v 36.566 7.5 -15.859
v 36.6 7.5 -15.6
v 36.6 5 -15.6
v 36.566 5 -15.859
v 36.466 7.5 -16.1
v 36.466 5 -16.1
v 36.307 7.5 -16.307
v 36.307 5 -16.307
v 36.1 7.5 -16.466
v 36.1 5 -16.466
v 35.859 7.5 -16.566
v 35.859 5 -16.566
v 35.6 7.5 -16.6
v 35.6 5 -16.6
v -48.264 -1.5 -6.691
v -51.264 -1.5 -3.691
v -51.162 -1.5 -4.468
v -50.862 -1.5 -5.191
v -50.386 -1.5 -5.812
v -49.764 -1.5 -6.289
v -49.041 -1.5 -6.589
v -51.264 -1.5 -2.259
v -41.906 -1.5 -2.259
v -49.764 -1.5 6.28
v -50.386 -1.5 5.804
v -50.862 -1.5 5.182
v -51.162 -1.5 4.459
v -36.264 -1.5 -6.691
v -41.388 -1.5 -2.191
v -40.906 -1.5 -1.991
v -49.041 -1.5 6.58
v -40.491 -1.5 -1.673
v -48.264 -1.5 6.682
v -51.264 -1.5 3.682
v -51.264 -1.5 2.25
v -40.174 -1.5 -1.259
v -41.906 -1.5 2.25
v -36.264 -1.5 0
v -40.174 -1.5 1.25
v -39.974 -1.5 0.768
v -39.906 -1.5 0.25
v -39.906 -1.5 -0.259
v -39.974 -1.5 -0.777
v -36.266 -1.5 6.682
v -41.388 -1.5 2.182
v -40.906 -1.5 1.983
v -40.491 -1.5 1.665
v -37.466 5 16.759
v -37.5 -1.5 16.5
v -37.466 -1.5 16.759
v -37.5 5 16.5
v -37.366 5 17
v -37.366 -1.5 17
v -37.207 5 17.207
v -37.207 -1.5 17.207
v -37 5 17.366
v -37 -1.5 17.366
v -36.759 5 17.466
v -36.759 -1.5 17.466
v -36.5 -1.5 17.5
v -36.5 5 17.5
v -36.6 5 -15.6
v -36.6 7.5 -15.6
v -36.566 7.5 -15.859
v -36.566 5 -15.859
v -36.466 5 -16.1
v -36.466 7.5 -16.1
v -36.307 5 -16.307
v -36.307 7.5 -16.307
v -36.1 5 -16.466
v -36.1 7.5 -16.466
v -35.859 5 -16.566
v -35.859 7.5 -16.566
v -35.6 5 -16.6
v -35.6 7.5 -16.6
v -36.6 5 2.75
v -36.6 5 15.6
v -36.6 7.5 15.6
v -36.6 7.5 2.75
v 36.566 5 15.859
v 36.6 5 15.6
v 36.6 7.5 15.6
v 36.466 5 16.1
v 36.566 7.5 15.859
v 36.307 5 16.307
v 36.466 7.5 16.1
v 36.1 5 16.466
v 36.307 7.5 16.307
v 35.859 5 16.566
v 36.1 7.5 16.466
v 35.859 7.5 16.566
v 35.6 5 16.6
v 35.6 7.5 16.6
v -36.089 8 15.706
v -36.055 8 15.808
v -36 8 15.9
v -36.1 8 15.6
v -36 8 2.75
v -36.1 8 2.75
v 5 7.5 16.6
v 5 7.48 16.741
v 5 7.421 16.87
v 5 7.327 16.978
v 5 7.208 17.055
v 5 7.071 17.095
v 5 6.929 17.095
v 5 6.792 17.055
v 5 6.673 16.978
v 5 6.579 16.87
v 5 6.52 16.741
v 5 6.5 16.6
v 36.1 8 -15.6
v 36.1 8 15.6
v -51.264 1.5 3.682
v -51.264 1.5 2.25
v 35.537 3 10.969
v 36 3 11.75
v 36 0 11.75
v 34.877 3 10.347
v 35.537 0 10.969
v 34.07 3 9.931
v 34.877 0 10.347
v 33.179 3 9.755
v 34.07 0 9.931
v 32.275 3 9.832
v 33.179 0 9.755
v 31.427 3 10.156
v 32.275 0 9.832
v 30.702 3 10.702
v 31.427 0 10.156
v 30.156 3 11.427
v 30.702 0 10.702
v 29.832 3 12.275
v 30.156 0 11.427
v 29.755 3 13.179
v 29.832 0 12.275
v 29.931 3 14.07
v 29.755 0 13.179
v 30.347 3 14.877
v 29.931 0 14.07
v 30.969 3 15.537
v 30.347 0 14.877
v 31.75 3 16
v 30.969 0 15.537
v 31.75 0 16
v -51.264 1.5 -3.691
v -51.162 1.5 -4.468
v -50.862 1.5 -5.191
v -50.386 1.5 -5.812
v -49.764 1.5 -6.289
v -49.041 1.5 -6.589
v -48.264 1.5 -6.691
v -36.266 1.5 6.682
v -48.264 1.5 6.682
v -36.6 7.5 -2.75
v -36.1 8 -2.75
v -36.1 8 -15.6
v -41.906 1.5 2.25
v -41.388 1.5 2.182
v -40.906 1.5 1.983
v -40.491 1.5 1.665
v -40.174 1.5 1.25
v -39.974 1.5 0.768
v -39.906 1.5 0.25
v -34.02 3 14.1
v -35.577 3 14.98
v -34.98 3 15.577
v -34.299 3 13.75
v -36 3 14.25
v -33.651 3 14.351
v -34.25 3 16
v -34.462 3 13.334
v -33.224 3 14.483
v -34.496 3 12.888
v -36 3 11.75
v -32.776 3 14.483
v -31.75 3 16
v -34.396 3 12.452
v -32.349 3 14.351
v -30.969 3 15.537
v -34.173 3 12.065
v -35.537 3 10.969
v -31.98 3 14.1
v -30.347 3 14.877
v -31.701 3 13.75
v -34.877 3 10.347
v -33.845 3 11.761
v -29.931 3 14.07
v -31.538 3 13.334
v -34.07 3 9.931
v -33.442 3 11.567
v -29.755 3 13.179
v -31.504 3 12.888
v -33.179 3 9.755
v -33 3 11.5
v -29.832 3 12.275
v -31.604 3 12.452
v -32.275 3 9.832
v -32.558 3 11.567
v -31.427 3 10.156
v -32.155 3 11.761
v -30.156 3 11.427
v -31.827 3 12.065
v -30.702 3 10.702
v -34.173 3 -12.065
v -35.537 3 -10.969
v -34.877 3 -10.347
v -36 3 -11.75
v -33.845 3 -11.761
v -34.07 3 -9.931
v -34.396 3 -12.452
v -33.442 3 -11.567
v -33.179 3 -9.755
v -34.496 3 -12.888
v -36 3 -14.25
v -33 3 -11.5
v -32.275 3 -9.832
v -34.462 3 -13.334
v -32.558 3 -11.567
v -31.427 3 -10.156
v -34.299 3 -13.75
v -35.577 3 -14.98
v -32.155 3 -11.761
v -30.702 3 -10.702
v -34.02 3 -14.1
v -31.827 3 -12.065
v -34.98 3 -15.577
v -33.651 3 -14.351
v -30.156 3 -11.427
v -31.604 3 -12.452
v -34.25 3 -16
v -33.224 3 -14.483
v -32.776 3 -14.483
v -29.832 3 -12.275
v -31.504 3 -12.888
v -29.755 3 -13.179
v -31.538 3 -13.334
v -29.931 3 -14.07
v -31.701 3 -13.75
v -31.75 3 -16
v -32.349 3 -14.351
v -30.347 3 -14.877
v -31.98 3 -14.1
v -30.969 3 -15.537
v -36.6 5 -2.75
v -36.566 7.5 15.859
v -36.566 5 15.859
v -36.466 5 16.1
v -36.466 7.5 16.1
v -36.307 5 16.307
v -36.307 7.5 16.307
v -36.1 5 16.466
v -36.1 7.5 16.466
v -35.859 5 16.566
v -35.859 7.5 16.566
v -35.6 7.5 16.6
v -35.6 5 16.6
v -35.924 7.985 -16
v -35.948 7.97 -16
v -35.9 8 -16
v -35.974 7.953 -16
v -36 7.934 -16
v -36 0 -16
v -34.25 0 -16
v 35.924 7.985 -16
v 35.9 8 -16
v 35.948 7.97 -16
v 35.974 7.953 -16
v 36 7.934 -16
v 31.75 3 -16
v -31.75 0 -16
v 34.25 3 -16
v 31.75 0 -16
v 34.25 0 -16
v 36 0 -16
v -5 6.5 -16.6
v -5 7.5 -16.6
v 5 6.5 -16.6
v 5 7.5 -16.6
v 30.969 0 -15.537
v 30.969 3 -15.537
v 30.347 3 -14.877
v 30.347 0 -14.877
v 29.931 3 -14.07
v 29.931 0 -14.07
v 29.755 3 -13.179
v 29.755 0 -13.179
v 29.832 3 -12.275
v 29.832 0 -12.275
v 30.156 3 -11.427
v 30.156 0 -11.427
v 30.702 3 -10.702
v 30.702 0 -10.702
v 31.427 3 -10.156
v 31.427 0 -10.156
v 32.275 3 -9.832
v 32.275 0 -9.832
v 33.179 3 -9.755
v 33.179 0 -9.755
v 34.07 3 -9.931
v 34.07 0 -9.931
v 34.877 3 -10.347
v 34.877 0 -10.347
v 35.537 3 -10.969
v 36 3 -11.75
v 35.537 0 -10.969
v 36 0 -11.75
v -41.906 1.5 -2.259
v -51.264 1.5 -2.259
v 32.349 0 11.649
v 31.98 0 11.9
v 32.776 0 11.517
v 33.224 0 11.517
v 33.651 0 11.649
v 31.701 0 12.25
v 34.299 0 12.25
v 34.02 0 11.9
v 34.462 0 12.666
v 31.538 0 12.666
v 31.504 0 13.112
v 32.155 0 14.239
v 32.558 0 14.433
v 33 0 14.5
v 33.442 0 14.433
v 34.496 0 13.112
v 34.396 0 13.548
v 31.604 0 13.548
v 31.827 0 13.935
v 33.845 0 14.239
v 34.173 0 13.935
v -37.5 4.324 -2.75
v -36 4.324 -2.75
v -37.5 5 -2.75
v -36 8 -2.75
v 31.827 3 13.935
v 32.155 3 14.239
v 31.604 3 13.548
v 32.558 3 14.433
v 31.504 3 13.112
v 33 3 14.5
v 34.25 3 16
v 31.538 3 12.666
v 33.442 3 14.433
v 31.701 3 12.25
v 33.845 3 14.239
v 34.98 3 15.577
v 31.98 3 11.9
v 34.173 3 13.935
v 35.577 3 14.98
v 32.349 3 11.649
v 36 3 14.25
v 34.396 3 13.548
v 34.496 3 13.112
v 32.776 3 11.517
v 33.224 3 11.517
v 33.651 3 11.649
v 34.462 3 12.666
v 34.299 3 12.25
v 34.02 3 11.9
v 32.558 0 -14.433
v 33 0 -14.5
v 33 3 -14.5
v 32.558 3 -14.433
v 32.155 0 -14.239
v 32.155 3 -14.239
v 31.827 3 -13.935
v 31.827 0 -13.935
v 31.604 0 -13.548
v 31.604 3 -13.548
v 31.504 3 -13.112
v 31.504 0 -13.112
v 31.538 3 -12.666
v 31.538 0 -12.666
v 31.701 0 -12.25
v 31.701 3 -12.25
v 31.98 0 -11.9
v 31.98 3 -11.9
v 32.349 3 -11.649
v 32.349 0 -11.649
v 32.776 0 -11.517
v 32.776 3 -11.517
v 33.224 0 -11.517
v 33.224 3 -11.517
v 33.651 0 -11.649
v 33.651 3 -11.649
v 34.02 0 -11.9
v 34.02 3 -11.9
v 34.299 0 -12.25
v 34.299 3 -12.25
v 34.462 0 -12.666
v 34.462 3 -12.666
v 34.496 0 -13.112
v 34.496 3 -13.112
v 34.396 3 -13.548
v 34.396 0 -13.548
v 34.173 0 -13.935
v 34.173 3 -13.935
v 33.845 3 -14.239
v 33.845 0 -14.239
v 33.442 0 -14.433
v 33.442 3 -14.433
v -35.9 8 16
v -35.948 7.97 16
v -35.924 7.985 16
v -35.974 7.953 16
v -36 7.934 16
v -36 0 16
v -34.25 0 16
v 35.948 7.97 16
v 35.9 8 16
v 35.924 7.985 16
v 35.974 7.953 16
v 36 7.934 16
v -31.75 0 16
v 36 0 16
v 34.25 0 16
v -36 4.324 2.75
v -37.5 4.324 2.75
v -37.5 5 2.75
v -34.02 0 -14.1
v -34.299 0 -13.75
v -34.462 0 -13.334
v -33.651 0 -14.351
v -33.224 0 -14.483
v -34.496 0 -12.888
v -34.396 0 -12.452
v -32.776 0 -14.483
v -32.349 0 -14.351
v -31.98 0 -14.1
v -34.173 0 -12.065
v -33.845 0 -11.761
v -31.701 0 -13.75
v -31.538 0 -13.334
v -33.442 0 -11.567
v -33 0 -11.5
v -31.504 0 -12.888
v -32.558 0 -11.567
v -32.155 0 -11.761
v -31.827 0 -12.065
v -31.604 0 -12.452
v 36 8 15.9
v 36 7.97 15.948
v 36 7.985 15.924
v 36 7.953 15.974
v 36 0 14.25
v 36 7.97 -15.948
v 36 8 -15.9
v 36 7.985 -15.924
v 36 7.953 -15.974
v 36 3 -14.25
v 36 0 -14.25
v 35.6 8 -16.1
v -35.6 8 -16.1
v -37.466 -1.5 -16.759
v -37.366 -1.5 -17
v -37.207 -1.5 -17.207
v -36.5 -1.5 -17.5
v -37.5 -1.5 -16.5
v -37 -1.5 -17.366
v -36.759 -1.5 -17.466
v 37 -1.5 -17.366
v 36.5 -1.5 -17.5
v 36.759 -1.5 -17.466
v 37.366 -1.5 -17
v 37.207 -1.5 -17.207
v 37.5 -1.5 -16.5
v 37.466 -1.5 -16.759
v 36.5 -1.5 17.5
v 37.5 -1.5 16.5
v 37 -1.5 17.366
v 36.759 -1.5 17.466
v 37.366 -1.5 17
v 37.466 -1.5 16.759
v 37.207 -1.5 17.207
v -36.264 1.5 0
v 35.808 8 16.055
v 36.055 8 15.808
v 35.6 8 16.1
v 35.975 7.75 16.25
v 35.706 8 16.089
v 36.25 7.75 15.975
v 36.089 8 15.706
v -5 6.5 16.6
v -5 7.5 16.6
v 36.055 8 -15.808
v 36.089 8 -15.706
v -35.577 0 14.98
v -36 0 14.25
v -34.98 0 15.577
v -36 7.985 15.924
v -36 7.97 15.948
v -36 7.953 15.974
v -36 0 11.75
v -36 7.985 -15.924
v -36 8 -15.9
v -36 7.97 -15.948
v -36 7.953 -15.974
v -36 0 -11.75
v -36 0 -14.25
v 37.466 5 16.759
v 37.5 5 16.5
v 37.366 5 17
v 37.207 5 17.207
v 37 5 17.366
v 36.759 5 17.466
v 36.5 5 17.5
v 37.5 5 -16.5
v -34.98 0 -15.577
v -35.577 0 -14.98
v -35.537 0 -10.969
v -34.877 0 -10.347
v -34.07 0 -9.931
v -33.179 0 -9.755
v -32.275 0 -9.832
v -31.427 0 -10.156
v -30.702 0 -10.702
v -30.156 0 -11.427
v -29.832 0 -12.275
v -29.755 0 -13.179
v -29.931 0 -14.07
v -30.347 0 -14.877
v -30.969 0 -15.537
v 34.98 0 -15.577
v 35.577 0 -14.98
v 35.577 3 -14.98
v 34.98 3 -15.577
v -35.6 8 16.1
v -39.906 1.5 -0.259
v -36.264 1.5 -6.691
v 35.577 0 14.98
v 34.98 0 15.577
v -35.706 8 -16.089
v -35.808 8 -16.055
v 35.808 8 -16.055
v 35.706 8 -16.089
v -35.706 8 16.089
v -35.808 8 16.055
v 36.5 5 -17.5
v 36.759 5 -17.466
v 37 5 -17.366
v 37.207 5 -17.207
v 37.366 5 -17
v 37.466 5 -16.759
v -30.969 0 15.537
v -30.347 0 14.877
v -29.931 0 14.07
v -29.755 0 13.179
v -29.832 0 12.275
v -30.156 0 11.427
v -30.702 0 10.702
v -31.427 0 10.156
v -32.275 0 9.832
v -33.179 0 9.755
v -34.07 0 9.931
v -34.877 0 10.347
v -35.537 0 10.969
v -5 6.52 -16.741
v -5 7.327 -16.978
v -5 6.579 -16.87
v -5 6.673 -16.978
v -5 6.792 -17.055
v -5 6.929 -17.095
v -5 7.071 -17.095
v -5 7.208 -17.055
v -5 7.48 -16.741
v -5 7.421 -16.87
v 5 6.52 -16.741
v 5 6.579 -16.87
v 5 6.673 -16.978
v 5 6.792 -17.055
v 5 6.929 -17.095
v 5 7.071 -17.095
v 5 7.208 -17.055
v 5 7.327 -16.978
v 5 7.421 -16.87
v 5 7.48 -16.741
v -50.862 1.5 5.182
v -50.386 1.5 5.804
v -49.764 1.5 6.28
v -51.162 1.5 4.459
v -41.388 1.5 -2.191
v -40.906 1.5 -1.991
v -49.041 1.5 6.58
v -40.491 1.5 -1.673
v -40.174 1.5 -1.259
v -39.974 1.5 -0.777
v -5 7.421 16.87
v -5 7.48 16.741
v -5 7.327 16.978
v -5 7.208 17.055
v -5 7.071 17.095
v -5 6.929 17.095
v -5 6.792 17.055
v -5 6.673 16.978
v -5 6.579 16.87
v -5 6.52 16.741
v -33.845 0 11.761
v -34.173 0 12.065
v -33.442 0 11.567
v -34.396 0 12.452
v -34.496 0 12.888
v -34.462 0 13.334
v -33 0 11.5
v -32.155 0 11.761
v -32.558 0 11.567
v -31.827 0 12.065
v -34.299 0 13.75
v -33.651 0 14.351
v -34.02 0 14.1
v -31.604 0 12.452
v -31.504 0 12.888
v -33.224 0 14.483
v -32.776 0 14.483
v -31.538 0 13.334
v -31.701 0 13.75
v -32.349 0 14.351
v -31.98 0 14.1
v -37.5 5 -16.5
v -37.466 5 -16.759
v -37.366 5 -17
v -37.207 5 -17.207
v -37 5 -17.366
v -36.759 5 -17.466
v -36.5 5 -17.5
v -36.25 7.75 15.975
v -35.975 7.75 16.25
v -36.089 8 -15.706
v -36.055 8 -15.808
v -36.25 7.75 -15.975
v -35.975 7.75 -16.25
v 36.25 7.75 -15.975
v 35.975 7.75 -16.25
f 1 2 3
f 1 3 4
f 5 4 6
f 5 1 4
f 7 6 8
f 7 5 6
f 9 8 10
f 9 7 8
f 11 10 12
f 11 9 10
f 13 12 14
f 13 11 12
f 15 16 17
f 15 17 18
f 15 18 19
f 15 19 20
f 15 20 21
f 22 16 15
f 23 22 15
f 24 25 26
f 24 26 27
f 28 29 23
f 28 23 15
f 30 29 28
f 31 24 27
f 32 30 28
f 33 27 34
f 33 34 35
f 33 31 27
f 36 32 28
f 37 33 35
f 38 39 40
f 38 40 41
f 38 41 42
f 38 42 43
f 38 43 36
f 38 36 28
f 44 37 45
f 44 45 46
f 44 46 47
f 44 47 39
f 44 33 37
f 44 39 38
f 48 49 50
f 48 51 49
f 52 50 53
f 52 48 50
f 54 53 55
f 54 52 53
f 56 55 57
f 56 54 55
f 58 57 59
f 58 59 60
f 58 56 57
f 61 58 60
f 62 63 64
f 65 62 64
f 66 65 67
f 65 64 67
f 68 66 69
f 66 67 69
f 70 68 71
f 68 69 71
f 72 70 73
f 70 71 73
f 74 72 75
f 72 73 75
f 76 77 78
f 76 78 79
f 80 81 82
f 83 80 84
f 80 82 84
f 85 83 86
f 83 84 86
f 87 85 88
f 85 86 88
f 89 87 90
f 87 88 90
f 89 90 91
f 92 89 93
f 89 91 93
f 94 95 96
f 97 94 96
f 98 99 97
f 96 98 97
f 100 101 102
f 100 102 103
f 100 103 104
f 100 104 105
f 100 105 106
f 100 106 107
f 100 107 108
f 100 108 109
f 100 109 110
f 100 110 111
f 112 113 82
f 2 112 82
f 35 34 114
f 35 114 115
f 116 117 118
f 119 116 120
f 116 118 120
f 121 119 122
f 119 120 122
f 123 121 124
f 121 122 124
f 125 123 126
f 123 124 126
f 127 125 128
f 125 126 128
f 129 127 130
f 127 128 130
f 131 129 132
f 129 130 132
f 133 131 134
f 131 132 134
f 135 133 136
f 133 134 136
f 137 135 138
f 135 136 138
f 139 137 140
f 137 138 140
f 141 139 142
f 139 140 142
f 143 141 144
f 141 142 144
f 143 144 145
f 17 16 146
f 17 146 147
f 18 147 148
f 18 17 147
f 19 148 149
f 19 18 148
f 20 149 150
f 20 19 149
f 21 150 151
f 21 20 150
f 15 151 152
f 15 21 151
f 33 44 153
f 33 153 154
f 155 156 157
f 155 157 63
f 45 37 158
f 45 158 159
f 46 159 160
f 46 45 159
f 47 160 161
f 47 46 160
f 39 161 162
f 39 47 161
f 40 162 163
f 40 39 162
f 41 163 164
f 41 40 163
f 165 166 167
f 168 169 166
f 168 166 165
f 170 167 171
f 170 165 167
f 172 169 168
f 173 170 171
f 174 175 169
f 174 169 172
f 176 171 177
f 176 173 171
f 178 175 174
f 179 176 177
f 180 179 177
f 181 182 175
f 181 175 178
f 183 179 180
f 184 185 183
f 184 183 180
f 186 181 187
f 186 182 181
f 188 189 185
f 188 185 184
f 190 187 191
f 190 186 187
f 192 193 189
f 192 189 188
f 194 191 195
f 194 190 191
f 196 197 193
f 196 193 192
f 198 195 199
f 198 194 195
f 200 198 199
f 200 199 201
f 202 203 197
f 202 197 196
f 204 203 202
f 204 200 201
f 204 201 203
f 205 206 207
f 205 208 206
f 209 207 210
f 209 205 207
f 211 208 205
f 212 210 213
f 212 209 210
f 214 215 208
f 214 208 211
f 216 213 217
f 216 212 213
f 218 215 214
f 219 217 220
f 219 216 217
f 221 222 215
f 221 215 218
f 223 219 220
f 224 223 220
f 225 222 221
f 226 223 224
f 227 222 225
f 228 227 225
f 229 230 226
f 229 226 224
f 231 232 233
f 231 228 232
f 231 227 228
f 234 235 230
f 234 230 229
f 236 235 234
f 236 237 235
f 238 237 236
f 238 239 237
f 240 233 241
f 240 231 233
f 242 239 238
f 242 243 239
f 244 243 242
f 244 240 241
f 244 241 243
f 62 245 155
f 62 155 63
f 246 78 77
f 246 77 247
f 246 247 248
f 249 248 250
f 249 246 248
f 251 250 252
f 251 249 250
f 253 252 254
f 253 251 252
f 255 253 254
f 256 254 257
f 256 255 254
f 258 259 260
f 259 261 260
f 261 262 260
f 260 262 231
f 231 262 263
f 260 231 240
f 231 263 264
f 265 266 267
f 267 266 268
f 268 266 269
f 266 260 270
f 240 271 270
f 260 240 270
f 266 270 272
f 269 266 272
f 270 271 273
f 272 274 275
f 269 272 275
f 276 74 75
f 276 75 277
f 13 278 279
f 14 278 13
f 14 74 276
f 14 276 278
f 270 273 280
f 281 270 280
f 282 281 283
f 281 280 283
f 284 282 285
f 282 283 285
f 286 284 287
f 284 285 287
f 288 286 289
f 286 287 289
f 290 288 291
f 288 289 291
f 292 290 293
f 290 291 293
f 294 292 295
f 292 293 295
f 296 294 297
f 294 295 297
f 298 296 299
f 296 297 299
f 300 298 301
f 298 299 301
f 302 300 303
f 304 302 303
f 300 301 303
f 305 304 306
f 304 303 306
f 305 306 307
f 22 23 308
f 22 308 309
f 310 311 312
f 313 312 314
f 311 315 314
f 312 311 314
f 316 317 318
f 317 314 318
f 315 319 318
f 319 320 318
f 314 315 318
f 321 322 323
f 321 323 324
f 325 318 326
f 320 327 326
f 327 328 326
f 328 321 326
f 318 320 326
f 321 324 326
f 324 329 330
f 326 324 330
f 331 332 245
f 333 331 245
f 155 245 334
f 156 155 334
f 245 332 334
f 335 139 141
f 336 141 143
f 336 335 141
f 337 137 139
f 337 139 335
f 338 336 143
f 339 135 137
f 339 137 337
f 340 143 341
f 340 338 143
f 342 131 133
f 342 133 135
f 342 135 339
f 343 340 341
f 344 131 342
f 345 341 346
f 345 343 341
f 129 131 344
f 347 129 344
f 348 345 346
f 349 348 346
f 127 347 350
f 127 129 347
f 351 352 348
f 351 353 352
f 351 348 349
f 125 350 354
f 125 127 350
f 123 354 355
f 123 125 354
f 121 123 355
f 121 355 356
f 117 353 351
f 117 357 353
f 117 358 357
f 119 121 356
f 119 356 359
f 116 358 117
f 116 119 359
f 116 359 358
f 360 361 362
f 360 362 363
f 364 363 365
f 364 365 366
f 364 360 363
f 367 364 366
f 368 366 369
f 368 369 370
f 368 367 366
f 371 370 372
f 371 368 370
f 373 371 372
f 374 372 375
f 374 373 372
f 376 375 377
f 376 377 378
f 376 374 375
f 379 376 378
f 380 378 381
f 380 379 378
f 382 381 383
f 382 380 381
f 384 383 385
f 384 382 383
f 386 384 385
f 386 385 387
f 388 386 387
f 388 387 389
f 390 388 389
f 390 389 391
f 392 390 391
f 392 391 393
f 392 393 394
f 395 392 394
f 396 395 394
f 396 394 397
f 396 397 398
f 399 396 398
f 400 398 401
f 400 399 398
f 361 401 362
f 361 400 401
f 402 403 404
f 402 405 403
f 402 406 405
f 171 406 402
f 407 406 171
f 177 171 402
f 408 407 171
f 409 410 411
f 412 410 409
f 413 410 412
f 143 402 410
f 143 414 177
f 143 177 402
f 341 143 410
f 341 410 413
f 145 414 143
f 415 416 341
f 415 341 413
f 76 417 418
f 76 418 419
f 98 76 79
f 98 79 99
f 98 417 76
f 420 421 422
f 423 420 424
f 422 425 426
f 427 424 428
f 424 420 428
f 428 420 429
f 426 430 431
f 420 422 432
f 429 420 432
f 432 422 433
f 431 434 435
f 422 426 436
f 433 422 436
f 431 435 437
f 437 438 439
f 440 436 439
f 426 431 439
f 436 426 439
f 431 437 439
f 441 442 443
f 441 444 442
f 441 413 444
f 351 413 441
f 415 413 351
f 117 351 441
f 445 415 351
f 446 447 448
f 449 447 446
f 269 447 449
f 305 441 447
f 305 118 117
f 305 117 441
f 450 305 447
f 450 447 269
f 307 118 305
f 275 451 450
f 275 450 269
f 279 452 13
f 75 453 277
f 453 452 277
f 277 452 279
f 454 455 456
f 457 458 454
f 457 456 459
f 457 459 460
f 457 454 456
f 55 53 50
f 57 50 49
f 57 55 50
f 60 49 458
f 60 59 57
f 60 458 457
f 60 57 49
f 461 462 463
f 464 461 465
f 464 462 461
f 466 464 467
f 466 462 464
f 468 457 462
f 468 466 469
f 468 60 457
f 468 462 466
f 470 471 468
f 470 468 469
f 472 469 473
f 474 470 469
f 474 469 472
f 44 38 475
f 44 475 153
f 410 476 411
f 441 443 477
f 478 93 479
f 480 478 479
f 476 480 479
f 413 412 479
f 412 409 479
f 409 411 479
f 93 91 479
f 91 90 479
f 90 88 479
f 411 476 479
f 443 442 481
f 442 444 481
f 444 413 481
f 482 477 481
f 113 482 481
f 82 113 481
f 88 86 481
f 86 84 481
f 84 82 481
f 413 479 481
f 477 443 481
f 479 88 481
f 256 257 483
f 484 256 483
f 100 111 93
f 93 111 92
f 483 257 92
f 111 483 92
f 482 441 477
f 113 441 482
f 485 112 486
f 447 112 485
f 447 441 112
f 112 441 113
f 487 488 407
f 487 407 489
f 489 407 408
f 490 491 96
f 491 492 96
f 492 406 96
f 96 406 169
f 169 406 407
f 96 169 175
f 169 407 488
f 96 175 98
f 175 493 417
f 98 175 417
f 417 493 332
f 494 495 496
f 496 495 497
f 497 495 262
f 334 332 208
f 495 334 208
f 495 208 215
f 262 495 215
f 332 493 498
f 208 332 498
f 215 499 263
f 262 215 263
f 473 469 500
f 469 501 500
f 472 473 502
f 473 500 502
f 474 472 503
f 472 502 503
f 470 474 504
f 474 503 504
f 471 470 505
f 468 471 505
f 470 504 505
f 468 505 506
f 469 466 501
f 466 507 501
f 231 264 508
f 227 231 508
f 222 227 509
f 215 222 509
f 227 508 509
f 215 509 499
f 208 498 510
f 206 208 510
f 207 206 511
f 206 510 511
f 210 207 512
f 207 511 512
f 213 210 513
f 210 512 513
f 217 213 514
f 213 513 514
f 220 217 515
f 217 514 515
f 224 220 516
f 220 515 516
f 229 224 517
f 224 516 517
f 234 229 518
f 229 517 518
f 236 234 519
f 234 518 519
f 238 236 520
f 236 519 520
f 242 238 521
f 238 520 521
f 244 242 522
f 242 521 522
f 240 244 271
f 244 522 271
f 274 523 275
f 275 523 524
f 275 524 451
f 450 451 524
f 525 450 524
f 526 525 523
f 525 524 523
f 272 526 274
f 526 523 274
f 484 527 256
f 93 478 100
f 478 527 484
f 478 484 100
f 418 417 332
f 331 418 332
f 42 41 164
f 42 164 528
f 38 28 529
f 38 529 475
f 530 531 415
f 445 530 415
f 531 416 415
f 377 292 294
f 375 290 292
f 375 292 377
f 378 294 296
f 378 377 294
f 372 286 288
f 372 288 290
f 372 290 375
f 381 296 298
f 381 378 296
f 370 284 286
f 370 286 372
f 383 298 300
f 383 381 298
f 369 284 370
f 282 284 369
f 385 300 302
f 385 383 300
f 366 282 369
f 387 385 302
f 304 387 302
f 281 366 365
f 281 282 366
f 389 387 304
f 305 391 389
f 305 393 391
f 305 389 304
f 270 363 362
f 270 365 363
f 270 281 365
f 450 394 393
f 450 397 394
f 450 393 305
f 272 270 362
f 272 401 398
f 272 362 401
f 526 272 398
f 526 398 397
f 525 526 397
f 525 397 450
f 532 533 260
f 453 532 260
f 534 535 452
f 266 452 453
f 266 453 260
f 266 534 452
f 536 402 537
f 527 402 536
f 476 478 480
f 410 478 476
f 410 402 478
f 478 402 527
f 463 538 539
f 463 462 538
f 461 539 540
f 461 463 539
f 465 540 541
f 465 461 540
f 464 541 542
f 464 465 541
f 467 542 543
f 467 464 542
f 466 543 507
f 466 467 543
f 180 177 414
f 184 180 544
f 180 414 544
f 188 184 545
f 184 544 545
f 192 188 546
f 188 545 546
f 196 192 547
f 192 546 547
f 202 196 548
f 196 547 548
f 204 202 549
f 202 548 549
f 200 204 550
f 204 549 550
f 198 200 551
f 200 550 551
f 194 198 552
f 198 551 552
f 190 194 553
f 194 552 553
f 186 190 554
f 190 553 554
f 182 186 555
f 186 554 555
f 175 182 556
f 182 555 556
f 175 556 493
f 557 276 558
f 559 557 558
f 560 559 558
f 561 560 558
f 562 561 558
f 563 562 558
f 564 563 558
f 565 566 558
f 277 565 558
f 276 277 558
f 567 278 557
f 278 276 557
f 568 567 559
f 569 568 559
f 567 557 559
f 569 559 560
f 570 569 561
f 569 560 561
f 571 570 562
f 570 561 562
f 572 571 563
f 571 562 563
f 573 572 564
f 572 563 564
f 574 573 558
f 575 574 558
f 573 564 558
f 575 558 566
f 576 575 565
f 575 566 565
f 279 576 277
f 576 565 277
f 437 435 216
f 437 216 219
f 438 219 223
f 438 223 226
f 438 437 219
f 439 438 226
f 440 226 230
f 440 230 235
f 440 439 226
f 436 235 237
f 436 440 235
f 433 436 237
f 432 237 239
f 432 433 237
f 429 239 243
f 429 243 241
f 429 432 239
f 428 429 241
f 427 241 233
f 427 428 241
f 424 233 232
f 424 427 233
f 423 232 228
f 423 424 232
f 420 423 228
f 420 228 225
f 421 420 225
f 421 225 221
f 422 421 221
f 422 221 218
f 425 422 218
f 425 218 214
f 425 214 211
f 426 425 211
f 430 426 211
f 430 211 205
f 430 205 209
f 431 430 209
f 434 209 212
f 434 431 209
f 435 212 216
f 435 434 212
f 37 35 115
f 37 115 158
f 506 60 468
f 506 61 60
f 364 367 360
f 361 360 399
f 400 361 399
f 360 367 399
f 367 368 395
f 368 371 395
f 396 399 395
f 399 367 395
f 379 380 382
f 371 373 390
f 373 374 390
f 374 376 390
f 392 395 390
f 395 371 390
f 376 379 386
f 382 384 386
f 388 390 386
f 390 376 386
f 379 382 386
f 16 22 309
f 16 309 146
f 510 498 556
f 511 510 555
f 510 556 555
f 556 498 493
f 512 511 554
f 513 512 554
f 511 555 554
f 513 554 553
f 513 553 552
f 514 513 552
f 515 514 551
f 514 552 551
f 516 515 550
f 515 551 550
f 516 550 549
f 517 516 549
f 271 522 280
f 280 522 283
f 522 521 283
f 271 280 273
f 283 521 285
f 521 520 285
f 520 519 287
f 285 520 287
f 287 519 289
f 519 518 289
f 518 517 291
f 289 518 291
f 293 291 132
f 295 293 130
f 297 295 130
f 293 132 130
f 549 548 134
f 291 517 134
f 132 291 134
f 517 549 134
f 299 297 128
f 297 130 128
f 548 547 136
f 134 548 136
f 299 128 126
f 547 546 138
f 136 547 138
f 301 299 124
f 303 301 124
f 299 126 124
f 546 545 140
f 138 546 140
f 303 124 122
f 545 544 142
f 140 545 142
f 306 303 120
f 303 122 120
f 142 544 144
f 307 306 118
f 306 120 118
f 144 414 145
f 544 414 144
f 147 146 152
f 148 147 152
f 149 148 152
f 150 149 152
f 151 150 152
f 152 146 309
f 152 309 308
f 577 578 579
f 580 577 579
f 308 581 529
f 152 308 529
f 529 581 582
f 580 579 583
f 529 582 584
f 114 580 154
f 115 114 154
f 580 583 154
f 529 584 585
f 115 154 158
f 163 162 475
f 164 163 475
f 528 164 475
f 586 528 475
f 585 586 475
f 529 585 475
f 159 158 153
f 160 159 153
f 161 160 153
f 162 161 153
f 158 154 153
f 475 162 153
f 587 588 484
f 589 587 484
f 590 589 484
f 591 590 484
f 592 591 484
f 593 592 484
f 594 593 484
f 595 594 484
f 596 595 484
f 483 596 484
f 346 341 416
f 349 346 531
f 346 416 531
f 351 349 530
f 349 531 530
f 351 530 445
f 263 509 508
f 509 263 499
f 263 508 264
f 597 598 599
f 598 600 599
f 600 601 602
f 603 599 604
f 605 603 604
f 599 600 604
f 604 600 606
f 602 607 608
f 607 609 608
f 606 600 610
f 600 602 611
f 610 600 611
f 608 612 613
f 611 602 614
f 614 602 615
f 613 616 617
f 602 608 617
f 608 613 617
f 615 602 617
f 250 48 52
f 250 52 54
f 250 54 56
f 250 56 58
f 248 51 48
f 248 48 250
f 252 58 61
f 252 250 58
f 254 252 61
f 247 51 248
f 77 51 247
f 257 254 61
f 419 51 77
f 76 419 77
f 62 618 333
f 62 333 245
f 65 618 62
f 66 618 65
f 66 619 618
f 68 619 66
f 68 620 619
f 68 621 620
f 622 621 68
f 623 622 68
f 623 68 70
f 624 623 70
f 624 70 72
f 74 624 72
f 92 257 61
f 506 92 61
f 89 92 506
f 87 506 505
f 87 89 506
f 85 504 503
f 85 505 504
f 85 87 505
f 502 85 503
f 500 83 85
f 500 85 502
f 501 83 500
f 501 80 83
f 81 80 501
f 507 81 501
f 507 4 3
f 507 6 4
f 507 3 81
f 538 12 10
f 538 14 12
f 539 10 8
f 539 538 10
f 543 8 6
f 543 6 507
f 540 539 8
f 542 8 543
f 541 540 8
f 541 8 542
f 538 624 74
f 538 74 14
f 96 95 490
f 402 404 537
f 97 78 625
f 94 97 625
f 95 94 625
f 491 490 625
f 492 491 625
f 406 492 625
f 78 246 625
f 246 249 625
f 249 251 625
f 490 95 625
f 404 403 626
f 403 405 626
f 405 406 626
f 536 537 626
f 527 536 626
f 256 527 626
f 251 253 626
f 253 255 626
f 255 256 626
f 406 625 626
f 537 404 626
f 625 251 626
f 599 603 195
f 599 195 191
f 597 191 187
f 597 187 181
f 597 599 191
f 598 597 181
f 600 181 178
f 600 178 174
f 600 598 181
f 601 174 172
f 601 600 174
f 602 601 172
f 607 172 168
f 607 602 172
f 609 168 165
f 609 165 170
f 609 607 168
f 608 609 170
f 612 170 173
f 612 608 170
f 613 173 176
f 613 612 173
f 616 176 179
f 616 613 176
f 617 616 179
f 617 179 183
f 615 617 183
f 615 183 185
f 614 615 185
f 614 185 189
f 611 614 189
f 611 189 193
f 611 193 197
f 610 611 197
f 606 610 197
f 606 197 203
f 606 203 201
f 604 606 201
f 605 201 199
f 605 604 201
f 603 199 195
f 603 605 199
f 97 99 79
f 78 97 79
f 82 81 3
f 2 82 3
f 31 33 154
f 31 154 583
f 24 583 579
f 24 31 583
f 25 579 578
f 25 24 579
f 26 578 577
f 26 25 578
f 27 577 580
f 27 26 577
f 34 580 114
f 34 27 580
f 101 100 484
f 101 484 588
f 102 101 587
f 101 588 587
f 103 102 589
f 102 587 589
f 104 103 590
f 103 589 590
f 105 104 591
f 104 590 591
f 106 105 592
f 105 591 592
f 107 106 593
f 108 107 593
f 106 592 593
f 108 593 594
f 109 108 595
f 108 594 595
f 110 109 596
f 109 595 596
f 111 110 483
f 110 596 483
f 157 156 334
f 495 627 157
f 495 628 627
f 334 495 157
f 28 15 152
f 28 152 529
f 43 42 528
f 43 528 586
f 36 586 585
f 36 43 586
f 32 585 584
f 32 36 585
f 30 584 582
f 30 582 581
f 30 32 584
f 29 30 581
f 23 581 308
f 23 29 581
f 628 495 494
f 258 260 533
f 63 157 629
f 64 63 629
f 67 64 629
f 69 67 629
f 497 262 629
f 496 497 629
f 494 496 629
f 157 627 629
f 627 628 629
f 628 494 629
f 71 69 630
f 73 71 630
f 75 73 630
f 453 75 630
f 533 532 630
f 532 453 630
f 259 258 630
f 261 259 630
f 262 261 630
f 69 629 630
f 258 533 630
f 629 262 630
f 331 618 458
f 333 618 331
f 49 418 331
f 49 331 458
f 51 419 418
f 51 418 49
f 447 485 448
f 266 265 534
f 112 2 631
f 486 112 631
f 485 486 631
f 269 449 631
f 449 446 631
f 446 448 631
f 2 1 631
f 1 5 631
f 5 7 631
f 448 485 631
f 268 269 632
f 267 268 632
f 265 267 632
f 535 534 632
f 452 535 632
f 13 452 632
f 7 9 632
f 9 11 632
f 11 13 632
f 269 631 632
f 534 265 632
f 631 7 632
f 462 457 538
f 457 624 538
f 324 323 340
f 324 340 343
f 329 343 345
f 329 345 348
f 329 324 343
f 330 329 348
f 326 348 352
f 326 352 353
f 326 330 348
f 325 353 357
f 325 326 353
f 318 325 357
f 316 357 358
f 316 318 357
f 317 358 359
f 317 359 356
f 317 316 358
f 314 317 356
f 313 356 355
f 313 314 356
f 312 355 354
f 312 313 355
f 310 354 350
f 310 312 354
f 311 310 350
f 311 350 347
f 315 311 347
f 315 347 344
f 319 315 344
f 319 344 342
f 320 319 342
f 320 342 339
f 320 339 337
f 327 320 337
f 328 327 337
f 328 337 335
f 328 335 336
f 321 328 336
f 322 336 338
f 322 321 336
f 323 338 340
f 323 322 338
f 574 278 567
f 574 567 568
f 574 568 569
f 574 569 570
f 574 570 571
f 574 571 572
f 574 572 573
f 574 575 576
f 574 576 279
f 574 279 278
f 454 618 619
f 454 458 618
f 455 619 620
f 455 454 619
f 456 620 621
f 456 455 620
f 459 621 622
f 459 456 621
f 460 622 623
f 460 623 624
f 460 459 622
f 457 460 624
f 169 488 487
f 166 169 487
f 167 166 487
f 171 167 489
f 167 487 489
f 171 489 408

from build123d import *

# Parameters (mm, degrees)
SKETCH_6_W           = 75
SKETCH_6_H           = 35
SKETCH_6_W_2         = 72
SKETCH_6_H_2         = 32
EXTRUDE_2_DEPTH      = 5
SKETCH_7_W           = 75
SKETCH_7_H           = 35
EXTRUDE_3_DEPTH      = 1.5
FILLET_2_R           = 1
SKETCH_8_R           = 3.25
SKETCH_8_R_2         = 1.5
EXTRUDE_4_DEPTH      = 3
EXTRUDE_5_DEPTH      = 3
SKETCH_10_W          = 73.2
SKETCH_10_H          = 33.2
SKETCH_10_W_2        = 72
SKETCH_10_H_2        = 32
EXTRUDE_6_DEPTH      = 3
FILLET_5_R           = 1
SKETCH_11_W          = 5.5
SKETCH_11_H          = 7.368080292
CUT_EXTRUDE_1_DEPTH  = 60
EXTRUDE_7_DEPTH      = 5
EXTRUDE_7_DEPTH_BACK = 5
SKETCH_12_R          = 0.5
CHAMFER_1_SIZE       = 0.5


with BuildPart() as part:
    # Эскиз6 → Бобышка-Вытянуть2 (new body)
    with BuildSketch(Plane(origin=(0, 0, 0), x_dir=(1, 0, 0), z_dir=(0, 1, 0))):
        Rectangle(SKETCH_6_W, SKETCH_6_H)
        Rectangle(SKETCH_6_W_2, SKETCH_6_H_2, mode=Mode.SUBTRACT)
    extrude(amount=EXTRUDE_2_DEPTH)

    # Эскиз7 → Бобышка-Вытянуть3 (add)
    with BuildSketch(Plane.XZ):
        Rectangle(SKETCH_7_W, SKETCH_7_H)
    extrude(amount=EXTRUDE_3_DEPTH)

    # Скругление2
    fillet_2_edges = [part.edges().sort_by_distance(p)[0] for p in [
        (37.5, 1.75, 17.5),
        (-37.5, 1.75, 17.5),
        (-37.5, 1.75, -17.5),
        (37.5, 1.75, -17.5),
    ]]
    fillet(fillet_2_edges, radius=FILLET_2_R)

    # Эскиз8 → Бобышка-Вытянуть4 (add)
    # profile 1 of 4: a face of its own
    with BuildSketch(Plane(origin=(0, 0, 0), x_dir=(1, 0, 0), z_dir=(0, 1, 0))):
        with Locations((-33, 13)):
            Circle(SKETCH_8_R)
        with Locations(Location((-33, 13, 0), (0, 0, 270))):
            Circle(SKETCH_8_R_2, mode=Mode.SUBTRACT)
    # profile 2 of 4: a face of its own
    with BuildSketch(Plane(origin=(0, 0, 0), x_dir=(1, 0, 0), z_dir=(0, 1, 0))):
        with Locations((-33, -13)):
            Circle(SKETCH_8_R)
        with Locations(Location((-33, -13, 0), (0, 0, 90))):
            Circle(SKETCH_8_R_2, mode=Mode.SUBTRACT)
    # profile 3 of 4: a face of its own
    with BuildSketch(Plane(origin=(0, 0, 0), x_dir=(1, 0, 0), z_dir=(0, 1, 0))):
        with Locations((33, 13)):
            Circle(SKETCH_8_R)
        with Locations(Location((33, 13, 0), (0, 0, 90))):
            Circle(SKETCH_8_R_2, mode=Mode.SUBTRACT)
    # profile 4 of 4: a face of its own
    with BuildSketch(Plane(origin=(0, 0, 0), x_dir=(1, 0, 0), z_dir=(0, 1, 0))):
        with Locations((33, -13)):
            Circle(SKETCH_8_R)
        with Locations(Location((33, -13, 0), (0, 0, 270))):
            Circle(SKETCH_8_R_2, mode=Mode.SUBTRACT)
    extrude(amount=EXTRUDE_4_DEPTH)

    # Эскиз10 → Бобышка-Вытянуть6 (add)
    with BuildSketch(Plane(origin=(0, 5, 0), x_dir=(1, 0, 0), z_dir=(0, 1, 0))):
        Rectangle(SKETCH_10_W, SKETCH_10_H)
        Rectangle(SKETCH_10_W_2, SKETCH_10_H_2, mode=Mode.SUBTRACT)
    extrude(amount=EXTRUDE_6_DEPTH)

    # Скругление5
    fillet_5_edges = [part.edges().sort_by_distance(p)[0] for p in [
        (-36.6, 6.5, -16.6),
        (-36.6, 6.5, 16.6),
        (36.6, 6.5, 16.6),
        (36.6, 6.5, -16.6),
    ]]
    fillet(fillet_5_edges, radius=FILLET_5_R)

    # Эскиз11 → Вырез-Вытянуть1 (cut)
    with BuildSketch(Plane(origin=(0, 0, 0), x_dir=(0, 0, -1), z_dir=(1, 0, 0))):
        with Locations((0, 8.00848738)):
            Rectangle(SKETCH_11_W, SKETCH_11_H)
    extrude(amount=-CUT_EXTRUDE_1_DEPTH, mode=Mode.SUBTRACT)

    # Эскиз12 → Бобышка-Вытянуть7 (add, two sides: drawn at the far end of the back side and taken through both)
    with BuildSketch(Plane(origin=(0, 0, 0), x_dir=(0, 0, -1), z_dir=(1, 0, 0)).offset(-EXTRUDE_7_DEPTH_BACK)):
        with Locations((-16.6, 7)):
            Circle(SKETCH_12_R)
        with Locations((16.6, 7)):
            Circle(SKETCH_12_R)
    extrude(amount=EXTRUDE_7_DEPTH + EXTRUDE_7_DEPTH_BACK)

    # Фаска1
    # the kernel refuses this chamfer: 0.5 mm, written as the material it takes off along each edge
    with BuildSketch(Plane(origin=(36.6, 8, -15.6), x_dir=(-0.9996219169112968, 0.02749587661058574, 0), z_dir=(0, 0, 1))) as chamfer_1_piece_1:
        Polygon((CHAMFER_1_SIZE * 0.999621916911, CHAMFER_1_SIZE * 0.0274958766106), (-CHAMFER_1_SIZE * 0.0274958766106, CHAMFER_1_SIZE * 0.999621916911), (0, 0), align=None)
    extrude(amount=31.2, mode=Mode.SUBTRACT)
    with BuildSketch(Plane(origin=(35.6, 8, 16.6), x_dir=(0, 0.02749587661058555, -0.9996219169112968), z_dir=(-1, 0, 0))) as chamfer_1_piece_2_section:
        Polygon((CHAMFER_1_SIZE * 0.999621916911, CHAMFER_1_SIZE * 0.0274958766106), (-CHAMFER_1_SIZE * 0.0274958766106, CHAMFER_1_SIZE * 0.999621916911), (0, 0), align=None)
    chamfer_1_piece_2 = extrude(amount=71.2, mode=Mode.PRIVATE)
    chamfer_1_piece_2 = split(chamfer_1_piece_2, bisect_by=Plane(origin=(5, 7.835672891, 16.434803325), z_dir=(1, 0, 0)), keep=Keep.TOP, mode=Mode.PRIVATE)
    chamfer_1_piece_2 = chamfer_1_piece_2 - Plane(origin=(20.3, 7, 16.6), x_dir=(0, 0, -1), z_dir=(-1, 0, 0)) * Cylinder(0.5, 145, mode=Mode.PRIVATE)
    add(chamfer_1_piece_2, mode=Mode.SUBTRACT)
    with BuildSketch(Plane(origin=(35.6, 8, 16.6), x_dir=(0, 0.02749587661058555, -0.9996219169112968), z_dir=(-1, 0, 0))) as chamfer_1_piece_3_section:
        Polygon((CHAMFER_1_SIZE * 0.999621916911, CHAMFER_1_SIZE * 0.0274958766106), (-CHAMFER_1_SIZE * 0.0274958766106, CHAMFER_1_SIZE * 0.999621916911), (0, 0), align=None)
    chamfer_1_piece_3 = extrude(amount=71.2, mode=Mode.PRIVATE)
    chamfer_1_piece_3 = split(chamfer_1_piece_3, bisect_by=Plane(origin=(5, 7.835672891, 16.434803325), z_dir=(-1, 0, 0)), keep=Keep.TOP, mode=Mode.PRIVATE)
    chamfer_1_piece_3 = split(chamfer_1_piece_3, bisect_by=Plane(origin=(-5, 7.835672891, 16.434803325), z_dir=(1, 0, 0)), keep=Keep.TOP, mode=Mode.PRIVATE)
    chamfer_1_piece_3 = chamfer_1_piece_3 - Plane(origin=(0, 7, 16.6), x_dir=(0, 0, -1), z_dir=(-1, 0, 0)) * Cylinder(0.5, 145, mode=Mode.PRIVATE)
    add(chamfer_1_piece_3, mode=Mode.SUBTRACT)
    with BuildSketch(Plane(origin=(35.6, 8, 16.6), x_dir=(0, 0.02749587661058555, -0.9996219169112968), z_dir=(-1, 0, 0))) as chamfer_1_piece_4_section:
        Polygon((CHAMFER_1_SIZE * 0.999621916911, CHAMFER_1_SIZE * 0.0274958766106), (-CHAMFER_1_SIZE * 0.0274958766106, CHAMFER_1_SIZE * 0.999621916911), (0, 0), align=None)
    chamfer_1_piece_4 = extrude(amount=71.2, mode=Mode.PRIVATE)
    chamfer_1_piece_4 = split(chamfer_1_piece_4, bisect_by=Plane(origin=(-5, 7.835672891, 16.434803325), z_dir=(-1, 0, 0)), keep=Keep.TOP, mode=Mode.PRIVATE)
    chamfer_1_piece_4 = chamfer_1_piece_4 - Plane(origin=(-20.3, 7, 16.6), x_dir=(0, 0, -1), z_dir=(-1, 0, 0)) * Cylinder(0.5, 145, mode=Mode.PRIVATE)
    add(chamfer_1_piece_4, mode=Mode.SUBTRACT)
    with BuildSketch(Plane(origin=(-36.6, 8, -1.464158506), x_dir=(0.9996219169112968, 0.02749587661058574, 0), z_dir=(0, 0, -1)), Plane(origin=(-36.6, 8, 15.6), x_dir=(0.9996219169112968, 0.02749587661058574, 0), z_dir=(0, 0, -1))) as chamfer_1_piece_5:
        Polygon((CHAMFER_1_SIZE * 0.999621916911, CHAMFER_1_SIZE * 0.0274958766106), (-CHAMFER_1_SIZE * 0.0274958766106, CHAMFER_1_SIZE * 0.999621916911), (0, 0), align=None)
    extrude(amount=14.135841494, mode=Mode.SUBTRACT)
    with BuildSketch(Plane(origin=(-35.6, 8, -16.6), x_dir=(0, 0.02749587661058555, 0.9996219169112968), z_dir=(1, 0, 0))) as chamfer_1_piece_6_section:
        Polygon((CHAMFER_1_SIZE * 0.999621916911, CHAMFER_1_SIZE * 0.0274958766106), (-CHAMFER_1_SIZE * 0.0274958766106, CHAMFER_1_SIZE * 0.999621916911), (0, 0), align=None)
    chamfer_1_piece_6 = extrude(amount=71.2, mode=Mode.PRIVATE)
    chamfer_1_piece_6 = chamfer_1_piece_6 - Plane(origin=(-20.3, 7, -16.6), x_dir=(0, 0, -1), z_dir=(-1, 0, 0)) * Cylinder(0.5, 145, mode=Mode.PRIVATE)
    chamfer_1_piece_6 = split(chamfer_1_piece_6, bisect_by=Plane(origin=(-5, 7.835672891, -16.434803325), z_dir=(-1, 0, 0)), keep=Keep.TOP, mode=Mode.PRIVATE)
    add(chamfer_1_piece_6, mode=Mode.SUBTRACT)
    with BuildSketch(Plane(origin=(-35.6, 8, -16.6), x_dir=(0, 0.02749587661058555, 0.9996219169112968), z_dir=(1, 0, 0))) as chamfer_1_piece_7_section:
        Polygon((CHAMFER_1_SIZE * 0.999621916911, CHAMFER_1_SIZE * 0.0274958766106), (-CHAMFER_1_SIZE * 0.0274958766106, CHAMFER_1_SIZE * 0.999621916911), (0, 0), align=None)
    chamfer_1_piece_7 = extrude(amount=71.2, mode=Mode.PRIVATE)
    chamfer_1_piece_7 = split(chamfer_1_piece_7, bisect_by=Plane(origin=(5, 7.835672891, -16.434803325), z_dir=(-1, 0, 0)), keep=Keep.TOP, mode=Mode.PRIVATE)
    chamfer_1_piece_7 = chamfer_1_piece_7 - Plane(origin=(0, 7, -16.6), x_dir=(0, 0, -1), z_dir=(-1, 0, 0)) * Cylinder(0.5, 145, mode=Mode.PRIVATE)
    chamfer_1_piece_7 = split(chamfer_1_piece_7, bisect_by=Plane(origin=(-5, 7.835672891, -16.434803325), z_dir=(1, 0, 0)), keep=Keep.TOP, mode=Mode.PRIVATE)
    add(chamfer_1_piece_7, mode=Mode.SUBTRACT)
    with BuildSketch(Plane(origin=(-35.6, 8, -16.6), x_dir=(0, 0.02749587661058555, 0.9996219169112968), z_dir=(1, 0, 0))) as chamfer_1_piece_8_section:
        Polygon((CHAMFER_1_SIZE * 0.999621916911, CHAMFER_1_SIZE * 0.0274958766106), (-CHAMFER_1_SIZE * 0.0274958766106, CHAMFER_1_SIZE * 0.999621916911), (0, 0), align=None)
    chamfer_1_piece_8 = extrude(amount=71.2, mode=Mode.PRIVATE)
    chamfer_1_piece_8 = split(chamfer_1_piece_8, bisect_by=Plane(origin=(5, 7.835672891, -16.434803325), z_dir=(1, 0, 0)), keep=Keep.TOP, mode=Mode.PRIVATE)
    chamfer_1_piece_8 = chamfer_1_piece_8 - Plane(origin=(20.3, 7, -16.6), x_dir=(0, 0, -1), z_dir=(-1, 0, 0)) * Cylinder(0.5, 145, mode=Mode.PRIVATE)
    add(chamfer_1_piece_8, mode=Mode.SUBTRACT)
    with BuildSketch(Plane(origin=(-35.6, 8, -15.6), x_dir=(-1, 0, 0), z_dir=(0, 0, 1))) as chamfer_1_piece_9:
        Polygon((1, CHAMFER_1_SIZE), (1 - CHAMFER_1_SIZE, 0), (1, 0), align=None)
    revolve(axis=Axis((-35.6, 8, -15.6), (0, -1, 0)), revolution_arc=90, mode=Mode.SUBTRACT)
    with BuildSketch(Plane(origin=(-35.6, 8, 15.6), x_dir=(-1, 0, 0), z_dir=(0, 0, -1))) as chamfer_1_piece_10:
        Polygon((1 - CHAMFER_1_SIZE, 0), (1, -CHAMFER_1_SIZE), (1, 0), align=None)
    revolve(axis=Axis((-35.6, 8, 15.6), (0, 1, 0)), revolution_arc=90, mode=Mode.SUBTRACT)
    with BuildSketch(Plane(origin=(35.6, 8, -15.6), x_dir=(1, 0, 0), z_dir=(0, 0, 1))) as chamfer_1_piece_11:
        Polygon((1 - CHAMFER_1_SIZE, 0), (1, -CHAMFER_1_SIZE), (1, 0), align=None)
    revolve(axis=Axis((35.6, 8, -15.6), (0, 1, 0)), revolution_arc=90, mode=Mode.SUBTRACT)
    with BuildSketch(Plane(origin=(35.6, 8, 15.6), x_dir=(0, 0, 1), z_dir=(-1, 0, 0))) as chamfer_1_piece_12:
        Polygon((1 - CHAMFER_1_SIZE, 0), (1, -CHAMFER_1_SIZE), (1, 0), align=None)
    revolve(axis=Axis((35.6, 8, 15.6), (0, 1, 0)), revolution_arc=90, mode=Mode.SUBTRACT)


with BuildPart() as body_2:
    # Эскиз9 → Бобышка-Вытянуть5 (new body)
    with BuildSketch(Plane.XZ.offset(1.5)):
        with BuildLine():
            Line((-36.264314741, -6.691050367), (-36.264314741, 0))
            Line((-36.264314741, 0), (-36.266484017, 6.682359232))
            Line((-36.266484017, 6.682359232), (-48.264314741, 6.682359232))
            ThreePointArc((-48.264314741, 6.682359232), (-50.385635084, 5.803679576), (-51.264314741, 3.682359232))
            Line((-51.264314741, 3.682359232), (-51.264314741, 2.250473493))
            Line((-51.264314741, 2.250473493), (-41.905662099, 2.250473493))
            ThreePointArc((-41.905662099, 2.250473493), (-40.491448537, 1.664687055), (-39.905662099, 0.250473493))
            Line((-39.905662099, 0.250473493), (-39.905662099, -0.259164628))
            ThreePointArc((-39.905662099, -0.259164628), (-40.491448537, -1.67337819), (-41.905662099, -2.259164628))
            Line((-41.905662099, -2.259164628), (-51.264314741, -2.259164628))
            Line((-51.264314741, -2.259164628), (-51.264314741, -3.691050367))
            ThreePointArc((-51.264314741, -3.691050367), (-50.385635084, -5.812370711), (-48.264314741, -6.691050367))
            Line((-48.264314741, -6.691050367), (-36.264314741, -6.691050367))
        make_face()
    extrude(amount=-EXTRUDE_5_DEPTH)


solid = Compound([part.part, body_2.part])
